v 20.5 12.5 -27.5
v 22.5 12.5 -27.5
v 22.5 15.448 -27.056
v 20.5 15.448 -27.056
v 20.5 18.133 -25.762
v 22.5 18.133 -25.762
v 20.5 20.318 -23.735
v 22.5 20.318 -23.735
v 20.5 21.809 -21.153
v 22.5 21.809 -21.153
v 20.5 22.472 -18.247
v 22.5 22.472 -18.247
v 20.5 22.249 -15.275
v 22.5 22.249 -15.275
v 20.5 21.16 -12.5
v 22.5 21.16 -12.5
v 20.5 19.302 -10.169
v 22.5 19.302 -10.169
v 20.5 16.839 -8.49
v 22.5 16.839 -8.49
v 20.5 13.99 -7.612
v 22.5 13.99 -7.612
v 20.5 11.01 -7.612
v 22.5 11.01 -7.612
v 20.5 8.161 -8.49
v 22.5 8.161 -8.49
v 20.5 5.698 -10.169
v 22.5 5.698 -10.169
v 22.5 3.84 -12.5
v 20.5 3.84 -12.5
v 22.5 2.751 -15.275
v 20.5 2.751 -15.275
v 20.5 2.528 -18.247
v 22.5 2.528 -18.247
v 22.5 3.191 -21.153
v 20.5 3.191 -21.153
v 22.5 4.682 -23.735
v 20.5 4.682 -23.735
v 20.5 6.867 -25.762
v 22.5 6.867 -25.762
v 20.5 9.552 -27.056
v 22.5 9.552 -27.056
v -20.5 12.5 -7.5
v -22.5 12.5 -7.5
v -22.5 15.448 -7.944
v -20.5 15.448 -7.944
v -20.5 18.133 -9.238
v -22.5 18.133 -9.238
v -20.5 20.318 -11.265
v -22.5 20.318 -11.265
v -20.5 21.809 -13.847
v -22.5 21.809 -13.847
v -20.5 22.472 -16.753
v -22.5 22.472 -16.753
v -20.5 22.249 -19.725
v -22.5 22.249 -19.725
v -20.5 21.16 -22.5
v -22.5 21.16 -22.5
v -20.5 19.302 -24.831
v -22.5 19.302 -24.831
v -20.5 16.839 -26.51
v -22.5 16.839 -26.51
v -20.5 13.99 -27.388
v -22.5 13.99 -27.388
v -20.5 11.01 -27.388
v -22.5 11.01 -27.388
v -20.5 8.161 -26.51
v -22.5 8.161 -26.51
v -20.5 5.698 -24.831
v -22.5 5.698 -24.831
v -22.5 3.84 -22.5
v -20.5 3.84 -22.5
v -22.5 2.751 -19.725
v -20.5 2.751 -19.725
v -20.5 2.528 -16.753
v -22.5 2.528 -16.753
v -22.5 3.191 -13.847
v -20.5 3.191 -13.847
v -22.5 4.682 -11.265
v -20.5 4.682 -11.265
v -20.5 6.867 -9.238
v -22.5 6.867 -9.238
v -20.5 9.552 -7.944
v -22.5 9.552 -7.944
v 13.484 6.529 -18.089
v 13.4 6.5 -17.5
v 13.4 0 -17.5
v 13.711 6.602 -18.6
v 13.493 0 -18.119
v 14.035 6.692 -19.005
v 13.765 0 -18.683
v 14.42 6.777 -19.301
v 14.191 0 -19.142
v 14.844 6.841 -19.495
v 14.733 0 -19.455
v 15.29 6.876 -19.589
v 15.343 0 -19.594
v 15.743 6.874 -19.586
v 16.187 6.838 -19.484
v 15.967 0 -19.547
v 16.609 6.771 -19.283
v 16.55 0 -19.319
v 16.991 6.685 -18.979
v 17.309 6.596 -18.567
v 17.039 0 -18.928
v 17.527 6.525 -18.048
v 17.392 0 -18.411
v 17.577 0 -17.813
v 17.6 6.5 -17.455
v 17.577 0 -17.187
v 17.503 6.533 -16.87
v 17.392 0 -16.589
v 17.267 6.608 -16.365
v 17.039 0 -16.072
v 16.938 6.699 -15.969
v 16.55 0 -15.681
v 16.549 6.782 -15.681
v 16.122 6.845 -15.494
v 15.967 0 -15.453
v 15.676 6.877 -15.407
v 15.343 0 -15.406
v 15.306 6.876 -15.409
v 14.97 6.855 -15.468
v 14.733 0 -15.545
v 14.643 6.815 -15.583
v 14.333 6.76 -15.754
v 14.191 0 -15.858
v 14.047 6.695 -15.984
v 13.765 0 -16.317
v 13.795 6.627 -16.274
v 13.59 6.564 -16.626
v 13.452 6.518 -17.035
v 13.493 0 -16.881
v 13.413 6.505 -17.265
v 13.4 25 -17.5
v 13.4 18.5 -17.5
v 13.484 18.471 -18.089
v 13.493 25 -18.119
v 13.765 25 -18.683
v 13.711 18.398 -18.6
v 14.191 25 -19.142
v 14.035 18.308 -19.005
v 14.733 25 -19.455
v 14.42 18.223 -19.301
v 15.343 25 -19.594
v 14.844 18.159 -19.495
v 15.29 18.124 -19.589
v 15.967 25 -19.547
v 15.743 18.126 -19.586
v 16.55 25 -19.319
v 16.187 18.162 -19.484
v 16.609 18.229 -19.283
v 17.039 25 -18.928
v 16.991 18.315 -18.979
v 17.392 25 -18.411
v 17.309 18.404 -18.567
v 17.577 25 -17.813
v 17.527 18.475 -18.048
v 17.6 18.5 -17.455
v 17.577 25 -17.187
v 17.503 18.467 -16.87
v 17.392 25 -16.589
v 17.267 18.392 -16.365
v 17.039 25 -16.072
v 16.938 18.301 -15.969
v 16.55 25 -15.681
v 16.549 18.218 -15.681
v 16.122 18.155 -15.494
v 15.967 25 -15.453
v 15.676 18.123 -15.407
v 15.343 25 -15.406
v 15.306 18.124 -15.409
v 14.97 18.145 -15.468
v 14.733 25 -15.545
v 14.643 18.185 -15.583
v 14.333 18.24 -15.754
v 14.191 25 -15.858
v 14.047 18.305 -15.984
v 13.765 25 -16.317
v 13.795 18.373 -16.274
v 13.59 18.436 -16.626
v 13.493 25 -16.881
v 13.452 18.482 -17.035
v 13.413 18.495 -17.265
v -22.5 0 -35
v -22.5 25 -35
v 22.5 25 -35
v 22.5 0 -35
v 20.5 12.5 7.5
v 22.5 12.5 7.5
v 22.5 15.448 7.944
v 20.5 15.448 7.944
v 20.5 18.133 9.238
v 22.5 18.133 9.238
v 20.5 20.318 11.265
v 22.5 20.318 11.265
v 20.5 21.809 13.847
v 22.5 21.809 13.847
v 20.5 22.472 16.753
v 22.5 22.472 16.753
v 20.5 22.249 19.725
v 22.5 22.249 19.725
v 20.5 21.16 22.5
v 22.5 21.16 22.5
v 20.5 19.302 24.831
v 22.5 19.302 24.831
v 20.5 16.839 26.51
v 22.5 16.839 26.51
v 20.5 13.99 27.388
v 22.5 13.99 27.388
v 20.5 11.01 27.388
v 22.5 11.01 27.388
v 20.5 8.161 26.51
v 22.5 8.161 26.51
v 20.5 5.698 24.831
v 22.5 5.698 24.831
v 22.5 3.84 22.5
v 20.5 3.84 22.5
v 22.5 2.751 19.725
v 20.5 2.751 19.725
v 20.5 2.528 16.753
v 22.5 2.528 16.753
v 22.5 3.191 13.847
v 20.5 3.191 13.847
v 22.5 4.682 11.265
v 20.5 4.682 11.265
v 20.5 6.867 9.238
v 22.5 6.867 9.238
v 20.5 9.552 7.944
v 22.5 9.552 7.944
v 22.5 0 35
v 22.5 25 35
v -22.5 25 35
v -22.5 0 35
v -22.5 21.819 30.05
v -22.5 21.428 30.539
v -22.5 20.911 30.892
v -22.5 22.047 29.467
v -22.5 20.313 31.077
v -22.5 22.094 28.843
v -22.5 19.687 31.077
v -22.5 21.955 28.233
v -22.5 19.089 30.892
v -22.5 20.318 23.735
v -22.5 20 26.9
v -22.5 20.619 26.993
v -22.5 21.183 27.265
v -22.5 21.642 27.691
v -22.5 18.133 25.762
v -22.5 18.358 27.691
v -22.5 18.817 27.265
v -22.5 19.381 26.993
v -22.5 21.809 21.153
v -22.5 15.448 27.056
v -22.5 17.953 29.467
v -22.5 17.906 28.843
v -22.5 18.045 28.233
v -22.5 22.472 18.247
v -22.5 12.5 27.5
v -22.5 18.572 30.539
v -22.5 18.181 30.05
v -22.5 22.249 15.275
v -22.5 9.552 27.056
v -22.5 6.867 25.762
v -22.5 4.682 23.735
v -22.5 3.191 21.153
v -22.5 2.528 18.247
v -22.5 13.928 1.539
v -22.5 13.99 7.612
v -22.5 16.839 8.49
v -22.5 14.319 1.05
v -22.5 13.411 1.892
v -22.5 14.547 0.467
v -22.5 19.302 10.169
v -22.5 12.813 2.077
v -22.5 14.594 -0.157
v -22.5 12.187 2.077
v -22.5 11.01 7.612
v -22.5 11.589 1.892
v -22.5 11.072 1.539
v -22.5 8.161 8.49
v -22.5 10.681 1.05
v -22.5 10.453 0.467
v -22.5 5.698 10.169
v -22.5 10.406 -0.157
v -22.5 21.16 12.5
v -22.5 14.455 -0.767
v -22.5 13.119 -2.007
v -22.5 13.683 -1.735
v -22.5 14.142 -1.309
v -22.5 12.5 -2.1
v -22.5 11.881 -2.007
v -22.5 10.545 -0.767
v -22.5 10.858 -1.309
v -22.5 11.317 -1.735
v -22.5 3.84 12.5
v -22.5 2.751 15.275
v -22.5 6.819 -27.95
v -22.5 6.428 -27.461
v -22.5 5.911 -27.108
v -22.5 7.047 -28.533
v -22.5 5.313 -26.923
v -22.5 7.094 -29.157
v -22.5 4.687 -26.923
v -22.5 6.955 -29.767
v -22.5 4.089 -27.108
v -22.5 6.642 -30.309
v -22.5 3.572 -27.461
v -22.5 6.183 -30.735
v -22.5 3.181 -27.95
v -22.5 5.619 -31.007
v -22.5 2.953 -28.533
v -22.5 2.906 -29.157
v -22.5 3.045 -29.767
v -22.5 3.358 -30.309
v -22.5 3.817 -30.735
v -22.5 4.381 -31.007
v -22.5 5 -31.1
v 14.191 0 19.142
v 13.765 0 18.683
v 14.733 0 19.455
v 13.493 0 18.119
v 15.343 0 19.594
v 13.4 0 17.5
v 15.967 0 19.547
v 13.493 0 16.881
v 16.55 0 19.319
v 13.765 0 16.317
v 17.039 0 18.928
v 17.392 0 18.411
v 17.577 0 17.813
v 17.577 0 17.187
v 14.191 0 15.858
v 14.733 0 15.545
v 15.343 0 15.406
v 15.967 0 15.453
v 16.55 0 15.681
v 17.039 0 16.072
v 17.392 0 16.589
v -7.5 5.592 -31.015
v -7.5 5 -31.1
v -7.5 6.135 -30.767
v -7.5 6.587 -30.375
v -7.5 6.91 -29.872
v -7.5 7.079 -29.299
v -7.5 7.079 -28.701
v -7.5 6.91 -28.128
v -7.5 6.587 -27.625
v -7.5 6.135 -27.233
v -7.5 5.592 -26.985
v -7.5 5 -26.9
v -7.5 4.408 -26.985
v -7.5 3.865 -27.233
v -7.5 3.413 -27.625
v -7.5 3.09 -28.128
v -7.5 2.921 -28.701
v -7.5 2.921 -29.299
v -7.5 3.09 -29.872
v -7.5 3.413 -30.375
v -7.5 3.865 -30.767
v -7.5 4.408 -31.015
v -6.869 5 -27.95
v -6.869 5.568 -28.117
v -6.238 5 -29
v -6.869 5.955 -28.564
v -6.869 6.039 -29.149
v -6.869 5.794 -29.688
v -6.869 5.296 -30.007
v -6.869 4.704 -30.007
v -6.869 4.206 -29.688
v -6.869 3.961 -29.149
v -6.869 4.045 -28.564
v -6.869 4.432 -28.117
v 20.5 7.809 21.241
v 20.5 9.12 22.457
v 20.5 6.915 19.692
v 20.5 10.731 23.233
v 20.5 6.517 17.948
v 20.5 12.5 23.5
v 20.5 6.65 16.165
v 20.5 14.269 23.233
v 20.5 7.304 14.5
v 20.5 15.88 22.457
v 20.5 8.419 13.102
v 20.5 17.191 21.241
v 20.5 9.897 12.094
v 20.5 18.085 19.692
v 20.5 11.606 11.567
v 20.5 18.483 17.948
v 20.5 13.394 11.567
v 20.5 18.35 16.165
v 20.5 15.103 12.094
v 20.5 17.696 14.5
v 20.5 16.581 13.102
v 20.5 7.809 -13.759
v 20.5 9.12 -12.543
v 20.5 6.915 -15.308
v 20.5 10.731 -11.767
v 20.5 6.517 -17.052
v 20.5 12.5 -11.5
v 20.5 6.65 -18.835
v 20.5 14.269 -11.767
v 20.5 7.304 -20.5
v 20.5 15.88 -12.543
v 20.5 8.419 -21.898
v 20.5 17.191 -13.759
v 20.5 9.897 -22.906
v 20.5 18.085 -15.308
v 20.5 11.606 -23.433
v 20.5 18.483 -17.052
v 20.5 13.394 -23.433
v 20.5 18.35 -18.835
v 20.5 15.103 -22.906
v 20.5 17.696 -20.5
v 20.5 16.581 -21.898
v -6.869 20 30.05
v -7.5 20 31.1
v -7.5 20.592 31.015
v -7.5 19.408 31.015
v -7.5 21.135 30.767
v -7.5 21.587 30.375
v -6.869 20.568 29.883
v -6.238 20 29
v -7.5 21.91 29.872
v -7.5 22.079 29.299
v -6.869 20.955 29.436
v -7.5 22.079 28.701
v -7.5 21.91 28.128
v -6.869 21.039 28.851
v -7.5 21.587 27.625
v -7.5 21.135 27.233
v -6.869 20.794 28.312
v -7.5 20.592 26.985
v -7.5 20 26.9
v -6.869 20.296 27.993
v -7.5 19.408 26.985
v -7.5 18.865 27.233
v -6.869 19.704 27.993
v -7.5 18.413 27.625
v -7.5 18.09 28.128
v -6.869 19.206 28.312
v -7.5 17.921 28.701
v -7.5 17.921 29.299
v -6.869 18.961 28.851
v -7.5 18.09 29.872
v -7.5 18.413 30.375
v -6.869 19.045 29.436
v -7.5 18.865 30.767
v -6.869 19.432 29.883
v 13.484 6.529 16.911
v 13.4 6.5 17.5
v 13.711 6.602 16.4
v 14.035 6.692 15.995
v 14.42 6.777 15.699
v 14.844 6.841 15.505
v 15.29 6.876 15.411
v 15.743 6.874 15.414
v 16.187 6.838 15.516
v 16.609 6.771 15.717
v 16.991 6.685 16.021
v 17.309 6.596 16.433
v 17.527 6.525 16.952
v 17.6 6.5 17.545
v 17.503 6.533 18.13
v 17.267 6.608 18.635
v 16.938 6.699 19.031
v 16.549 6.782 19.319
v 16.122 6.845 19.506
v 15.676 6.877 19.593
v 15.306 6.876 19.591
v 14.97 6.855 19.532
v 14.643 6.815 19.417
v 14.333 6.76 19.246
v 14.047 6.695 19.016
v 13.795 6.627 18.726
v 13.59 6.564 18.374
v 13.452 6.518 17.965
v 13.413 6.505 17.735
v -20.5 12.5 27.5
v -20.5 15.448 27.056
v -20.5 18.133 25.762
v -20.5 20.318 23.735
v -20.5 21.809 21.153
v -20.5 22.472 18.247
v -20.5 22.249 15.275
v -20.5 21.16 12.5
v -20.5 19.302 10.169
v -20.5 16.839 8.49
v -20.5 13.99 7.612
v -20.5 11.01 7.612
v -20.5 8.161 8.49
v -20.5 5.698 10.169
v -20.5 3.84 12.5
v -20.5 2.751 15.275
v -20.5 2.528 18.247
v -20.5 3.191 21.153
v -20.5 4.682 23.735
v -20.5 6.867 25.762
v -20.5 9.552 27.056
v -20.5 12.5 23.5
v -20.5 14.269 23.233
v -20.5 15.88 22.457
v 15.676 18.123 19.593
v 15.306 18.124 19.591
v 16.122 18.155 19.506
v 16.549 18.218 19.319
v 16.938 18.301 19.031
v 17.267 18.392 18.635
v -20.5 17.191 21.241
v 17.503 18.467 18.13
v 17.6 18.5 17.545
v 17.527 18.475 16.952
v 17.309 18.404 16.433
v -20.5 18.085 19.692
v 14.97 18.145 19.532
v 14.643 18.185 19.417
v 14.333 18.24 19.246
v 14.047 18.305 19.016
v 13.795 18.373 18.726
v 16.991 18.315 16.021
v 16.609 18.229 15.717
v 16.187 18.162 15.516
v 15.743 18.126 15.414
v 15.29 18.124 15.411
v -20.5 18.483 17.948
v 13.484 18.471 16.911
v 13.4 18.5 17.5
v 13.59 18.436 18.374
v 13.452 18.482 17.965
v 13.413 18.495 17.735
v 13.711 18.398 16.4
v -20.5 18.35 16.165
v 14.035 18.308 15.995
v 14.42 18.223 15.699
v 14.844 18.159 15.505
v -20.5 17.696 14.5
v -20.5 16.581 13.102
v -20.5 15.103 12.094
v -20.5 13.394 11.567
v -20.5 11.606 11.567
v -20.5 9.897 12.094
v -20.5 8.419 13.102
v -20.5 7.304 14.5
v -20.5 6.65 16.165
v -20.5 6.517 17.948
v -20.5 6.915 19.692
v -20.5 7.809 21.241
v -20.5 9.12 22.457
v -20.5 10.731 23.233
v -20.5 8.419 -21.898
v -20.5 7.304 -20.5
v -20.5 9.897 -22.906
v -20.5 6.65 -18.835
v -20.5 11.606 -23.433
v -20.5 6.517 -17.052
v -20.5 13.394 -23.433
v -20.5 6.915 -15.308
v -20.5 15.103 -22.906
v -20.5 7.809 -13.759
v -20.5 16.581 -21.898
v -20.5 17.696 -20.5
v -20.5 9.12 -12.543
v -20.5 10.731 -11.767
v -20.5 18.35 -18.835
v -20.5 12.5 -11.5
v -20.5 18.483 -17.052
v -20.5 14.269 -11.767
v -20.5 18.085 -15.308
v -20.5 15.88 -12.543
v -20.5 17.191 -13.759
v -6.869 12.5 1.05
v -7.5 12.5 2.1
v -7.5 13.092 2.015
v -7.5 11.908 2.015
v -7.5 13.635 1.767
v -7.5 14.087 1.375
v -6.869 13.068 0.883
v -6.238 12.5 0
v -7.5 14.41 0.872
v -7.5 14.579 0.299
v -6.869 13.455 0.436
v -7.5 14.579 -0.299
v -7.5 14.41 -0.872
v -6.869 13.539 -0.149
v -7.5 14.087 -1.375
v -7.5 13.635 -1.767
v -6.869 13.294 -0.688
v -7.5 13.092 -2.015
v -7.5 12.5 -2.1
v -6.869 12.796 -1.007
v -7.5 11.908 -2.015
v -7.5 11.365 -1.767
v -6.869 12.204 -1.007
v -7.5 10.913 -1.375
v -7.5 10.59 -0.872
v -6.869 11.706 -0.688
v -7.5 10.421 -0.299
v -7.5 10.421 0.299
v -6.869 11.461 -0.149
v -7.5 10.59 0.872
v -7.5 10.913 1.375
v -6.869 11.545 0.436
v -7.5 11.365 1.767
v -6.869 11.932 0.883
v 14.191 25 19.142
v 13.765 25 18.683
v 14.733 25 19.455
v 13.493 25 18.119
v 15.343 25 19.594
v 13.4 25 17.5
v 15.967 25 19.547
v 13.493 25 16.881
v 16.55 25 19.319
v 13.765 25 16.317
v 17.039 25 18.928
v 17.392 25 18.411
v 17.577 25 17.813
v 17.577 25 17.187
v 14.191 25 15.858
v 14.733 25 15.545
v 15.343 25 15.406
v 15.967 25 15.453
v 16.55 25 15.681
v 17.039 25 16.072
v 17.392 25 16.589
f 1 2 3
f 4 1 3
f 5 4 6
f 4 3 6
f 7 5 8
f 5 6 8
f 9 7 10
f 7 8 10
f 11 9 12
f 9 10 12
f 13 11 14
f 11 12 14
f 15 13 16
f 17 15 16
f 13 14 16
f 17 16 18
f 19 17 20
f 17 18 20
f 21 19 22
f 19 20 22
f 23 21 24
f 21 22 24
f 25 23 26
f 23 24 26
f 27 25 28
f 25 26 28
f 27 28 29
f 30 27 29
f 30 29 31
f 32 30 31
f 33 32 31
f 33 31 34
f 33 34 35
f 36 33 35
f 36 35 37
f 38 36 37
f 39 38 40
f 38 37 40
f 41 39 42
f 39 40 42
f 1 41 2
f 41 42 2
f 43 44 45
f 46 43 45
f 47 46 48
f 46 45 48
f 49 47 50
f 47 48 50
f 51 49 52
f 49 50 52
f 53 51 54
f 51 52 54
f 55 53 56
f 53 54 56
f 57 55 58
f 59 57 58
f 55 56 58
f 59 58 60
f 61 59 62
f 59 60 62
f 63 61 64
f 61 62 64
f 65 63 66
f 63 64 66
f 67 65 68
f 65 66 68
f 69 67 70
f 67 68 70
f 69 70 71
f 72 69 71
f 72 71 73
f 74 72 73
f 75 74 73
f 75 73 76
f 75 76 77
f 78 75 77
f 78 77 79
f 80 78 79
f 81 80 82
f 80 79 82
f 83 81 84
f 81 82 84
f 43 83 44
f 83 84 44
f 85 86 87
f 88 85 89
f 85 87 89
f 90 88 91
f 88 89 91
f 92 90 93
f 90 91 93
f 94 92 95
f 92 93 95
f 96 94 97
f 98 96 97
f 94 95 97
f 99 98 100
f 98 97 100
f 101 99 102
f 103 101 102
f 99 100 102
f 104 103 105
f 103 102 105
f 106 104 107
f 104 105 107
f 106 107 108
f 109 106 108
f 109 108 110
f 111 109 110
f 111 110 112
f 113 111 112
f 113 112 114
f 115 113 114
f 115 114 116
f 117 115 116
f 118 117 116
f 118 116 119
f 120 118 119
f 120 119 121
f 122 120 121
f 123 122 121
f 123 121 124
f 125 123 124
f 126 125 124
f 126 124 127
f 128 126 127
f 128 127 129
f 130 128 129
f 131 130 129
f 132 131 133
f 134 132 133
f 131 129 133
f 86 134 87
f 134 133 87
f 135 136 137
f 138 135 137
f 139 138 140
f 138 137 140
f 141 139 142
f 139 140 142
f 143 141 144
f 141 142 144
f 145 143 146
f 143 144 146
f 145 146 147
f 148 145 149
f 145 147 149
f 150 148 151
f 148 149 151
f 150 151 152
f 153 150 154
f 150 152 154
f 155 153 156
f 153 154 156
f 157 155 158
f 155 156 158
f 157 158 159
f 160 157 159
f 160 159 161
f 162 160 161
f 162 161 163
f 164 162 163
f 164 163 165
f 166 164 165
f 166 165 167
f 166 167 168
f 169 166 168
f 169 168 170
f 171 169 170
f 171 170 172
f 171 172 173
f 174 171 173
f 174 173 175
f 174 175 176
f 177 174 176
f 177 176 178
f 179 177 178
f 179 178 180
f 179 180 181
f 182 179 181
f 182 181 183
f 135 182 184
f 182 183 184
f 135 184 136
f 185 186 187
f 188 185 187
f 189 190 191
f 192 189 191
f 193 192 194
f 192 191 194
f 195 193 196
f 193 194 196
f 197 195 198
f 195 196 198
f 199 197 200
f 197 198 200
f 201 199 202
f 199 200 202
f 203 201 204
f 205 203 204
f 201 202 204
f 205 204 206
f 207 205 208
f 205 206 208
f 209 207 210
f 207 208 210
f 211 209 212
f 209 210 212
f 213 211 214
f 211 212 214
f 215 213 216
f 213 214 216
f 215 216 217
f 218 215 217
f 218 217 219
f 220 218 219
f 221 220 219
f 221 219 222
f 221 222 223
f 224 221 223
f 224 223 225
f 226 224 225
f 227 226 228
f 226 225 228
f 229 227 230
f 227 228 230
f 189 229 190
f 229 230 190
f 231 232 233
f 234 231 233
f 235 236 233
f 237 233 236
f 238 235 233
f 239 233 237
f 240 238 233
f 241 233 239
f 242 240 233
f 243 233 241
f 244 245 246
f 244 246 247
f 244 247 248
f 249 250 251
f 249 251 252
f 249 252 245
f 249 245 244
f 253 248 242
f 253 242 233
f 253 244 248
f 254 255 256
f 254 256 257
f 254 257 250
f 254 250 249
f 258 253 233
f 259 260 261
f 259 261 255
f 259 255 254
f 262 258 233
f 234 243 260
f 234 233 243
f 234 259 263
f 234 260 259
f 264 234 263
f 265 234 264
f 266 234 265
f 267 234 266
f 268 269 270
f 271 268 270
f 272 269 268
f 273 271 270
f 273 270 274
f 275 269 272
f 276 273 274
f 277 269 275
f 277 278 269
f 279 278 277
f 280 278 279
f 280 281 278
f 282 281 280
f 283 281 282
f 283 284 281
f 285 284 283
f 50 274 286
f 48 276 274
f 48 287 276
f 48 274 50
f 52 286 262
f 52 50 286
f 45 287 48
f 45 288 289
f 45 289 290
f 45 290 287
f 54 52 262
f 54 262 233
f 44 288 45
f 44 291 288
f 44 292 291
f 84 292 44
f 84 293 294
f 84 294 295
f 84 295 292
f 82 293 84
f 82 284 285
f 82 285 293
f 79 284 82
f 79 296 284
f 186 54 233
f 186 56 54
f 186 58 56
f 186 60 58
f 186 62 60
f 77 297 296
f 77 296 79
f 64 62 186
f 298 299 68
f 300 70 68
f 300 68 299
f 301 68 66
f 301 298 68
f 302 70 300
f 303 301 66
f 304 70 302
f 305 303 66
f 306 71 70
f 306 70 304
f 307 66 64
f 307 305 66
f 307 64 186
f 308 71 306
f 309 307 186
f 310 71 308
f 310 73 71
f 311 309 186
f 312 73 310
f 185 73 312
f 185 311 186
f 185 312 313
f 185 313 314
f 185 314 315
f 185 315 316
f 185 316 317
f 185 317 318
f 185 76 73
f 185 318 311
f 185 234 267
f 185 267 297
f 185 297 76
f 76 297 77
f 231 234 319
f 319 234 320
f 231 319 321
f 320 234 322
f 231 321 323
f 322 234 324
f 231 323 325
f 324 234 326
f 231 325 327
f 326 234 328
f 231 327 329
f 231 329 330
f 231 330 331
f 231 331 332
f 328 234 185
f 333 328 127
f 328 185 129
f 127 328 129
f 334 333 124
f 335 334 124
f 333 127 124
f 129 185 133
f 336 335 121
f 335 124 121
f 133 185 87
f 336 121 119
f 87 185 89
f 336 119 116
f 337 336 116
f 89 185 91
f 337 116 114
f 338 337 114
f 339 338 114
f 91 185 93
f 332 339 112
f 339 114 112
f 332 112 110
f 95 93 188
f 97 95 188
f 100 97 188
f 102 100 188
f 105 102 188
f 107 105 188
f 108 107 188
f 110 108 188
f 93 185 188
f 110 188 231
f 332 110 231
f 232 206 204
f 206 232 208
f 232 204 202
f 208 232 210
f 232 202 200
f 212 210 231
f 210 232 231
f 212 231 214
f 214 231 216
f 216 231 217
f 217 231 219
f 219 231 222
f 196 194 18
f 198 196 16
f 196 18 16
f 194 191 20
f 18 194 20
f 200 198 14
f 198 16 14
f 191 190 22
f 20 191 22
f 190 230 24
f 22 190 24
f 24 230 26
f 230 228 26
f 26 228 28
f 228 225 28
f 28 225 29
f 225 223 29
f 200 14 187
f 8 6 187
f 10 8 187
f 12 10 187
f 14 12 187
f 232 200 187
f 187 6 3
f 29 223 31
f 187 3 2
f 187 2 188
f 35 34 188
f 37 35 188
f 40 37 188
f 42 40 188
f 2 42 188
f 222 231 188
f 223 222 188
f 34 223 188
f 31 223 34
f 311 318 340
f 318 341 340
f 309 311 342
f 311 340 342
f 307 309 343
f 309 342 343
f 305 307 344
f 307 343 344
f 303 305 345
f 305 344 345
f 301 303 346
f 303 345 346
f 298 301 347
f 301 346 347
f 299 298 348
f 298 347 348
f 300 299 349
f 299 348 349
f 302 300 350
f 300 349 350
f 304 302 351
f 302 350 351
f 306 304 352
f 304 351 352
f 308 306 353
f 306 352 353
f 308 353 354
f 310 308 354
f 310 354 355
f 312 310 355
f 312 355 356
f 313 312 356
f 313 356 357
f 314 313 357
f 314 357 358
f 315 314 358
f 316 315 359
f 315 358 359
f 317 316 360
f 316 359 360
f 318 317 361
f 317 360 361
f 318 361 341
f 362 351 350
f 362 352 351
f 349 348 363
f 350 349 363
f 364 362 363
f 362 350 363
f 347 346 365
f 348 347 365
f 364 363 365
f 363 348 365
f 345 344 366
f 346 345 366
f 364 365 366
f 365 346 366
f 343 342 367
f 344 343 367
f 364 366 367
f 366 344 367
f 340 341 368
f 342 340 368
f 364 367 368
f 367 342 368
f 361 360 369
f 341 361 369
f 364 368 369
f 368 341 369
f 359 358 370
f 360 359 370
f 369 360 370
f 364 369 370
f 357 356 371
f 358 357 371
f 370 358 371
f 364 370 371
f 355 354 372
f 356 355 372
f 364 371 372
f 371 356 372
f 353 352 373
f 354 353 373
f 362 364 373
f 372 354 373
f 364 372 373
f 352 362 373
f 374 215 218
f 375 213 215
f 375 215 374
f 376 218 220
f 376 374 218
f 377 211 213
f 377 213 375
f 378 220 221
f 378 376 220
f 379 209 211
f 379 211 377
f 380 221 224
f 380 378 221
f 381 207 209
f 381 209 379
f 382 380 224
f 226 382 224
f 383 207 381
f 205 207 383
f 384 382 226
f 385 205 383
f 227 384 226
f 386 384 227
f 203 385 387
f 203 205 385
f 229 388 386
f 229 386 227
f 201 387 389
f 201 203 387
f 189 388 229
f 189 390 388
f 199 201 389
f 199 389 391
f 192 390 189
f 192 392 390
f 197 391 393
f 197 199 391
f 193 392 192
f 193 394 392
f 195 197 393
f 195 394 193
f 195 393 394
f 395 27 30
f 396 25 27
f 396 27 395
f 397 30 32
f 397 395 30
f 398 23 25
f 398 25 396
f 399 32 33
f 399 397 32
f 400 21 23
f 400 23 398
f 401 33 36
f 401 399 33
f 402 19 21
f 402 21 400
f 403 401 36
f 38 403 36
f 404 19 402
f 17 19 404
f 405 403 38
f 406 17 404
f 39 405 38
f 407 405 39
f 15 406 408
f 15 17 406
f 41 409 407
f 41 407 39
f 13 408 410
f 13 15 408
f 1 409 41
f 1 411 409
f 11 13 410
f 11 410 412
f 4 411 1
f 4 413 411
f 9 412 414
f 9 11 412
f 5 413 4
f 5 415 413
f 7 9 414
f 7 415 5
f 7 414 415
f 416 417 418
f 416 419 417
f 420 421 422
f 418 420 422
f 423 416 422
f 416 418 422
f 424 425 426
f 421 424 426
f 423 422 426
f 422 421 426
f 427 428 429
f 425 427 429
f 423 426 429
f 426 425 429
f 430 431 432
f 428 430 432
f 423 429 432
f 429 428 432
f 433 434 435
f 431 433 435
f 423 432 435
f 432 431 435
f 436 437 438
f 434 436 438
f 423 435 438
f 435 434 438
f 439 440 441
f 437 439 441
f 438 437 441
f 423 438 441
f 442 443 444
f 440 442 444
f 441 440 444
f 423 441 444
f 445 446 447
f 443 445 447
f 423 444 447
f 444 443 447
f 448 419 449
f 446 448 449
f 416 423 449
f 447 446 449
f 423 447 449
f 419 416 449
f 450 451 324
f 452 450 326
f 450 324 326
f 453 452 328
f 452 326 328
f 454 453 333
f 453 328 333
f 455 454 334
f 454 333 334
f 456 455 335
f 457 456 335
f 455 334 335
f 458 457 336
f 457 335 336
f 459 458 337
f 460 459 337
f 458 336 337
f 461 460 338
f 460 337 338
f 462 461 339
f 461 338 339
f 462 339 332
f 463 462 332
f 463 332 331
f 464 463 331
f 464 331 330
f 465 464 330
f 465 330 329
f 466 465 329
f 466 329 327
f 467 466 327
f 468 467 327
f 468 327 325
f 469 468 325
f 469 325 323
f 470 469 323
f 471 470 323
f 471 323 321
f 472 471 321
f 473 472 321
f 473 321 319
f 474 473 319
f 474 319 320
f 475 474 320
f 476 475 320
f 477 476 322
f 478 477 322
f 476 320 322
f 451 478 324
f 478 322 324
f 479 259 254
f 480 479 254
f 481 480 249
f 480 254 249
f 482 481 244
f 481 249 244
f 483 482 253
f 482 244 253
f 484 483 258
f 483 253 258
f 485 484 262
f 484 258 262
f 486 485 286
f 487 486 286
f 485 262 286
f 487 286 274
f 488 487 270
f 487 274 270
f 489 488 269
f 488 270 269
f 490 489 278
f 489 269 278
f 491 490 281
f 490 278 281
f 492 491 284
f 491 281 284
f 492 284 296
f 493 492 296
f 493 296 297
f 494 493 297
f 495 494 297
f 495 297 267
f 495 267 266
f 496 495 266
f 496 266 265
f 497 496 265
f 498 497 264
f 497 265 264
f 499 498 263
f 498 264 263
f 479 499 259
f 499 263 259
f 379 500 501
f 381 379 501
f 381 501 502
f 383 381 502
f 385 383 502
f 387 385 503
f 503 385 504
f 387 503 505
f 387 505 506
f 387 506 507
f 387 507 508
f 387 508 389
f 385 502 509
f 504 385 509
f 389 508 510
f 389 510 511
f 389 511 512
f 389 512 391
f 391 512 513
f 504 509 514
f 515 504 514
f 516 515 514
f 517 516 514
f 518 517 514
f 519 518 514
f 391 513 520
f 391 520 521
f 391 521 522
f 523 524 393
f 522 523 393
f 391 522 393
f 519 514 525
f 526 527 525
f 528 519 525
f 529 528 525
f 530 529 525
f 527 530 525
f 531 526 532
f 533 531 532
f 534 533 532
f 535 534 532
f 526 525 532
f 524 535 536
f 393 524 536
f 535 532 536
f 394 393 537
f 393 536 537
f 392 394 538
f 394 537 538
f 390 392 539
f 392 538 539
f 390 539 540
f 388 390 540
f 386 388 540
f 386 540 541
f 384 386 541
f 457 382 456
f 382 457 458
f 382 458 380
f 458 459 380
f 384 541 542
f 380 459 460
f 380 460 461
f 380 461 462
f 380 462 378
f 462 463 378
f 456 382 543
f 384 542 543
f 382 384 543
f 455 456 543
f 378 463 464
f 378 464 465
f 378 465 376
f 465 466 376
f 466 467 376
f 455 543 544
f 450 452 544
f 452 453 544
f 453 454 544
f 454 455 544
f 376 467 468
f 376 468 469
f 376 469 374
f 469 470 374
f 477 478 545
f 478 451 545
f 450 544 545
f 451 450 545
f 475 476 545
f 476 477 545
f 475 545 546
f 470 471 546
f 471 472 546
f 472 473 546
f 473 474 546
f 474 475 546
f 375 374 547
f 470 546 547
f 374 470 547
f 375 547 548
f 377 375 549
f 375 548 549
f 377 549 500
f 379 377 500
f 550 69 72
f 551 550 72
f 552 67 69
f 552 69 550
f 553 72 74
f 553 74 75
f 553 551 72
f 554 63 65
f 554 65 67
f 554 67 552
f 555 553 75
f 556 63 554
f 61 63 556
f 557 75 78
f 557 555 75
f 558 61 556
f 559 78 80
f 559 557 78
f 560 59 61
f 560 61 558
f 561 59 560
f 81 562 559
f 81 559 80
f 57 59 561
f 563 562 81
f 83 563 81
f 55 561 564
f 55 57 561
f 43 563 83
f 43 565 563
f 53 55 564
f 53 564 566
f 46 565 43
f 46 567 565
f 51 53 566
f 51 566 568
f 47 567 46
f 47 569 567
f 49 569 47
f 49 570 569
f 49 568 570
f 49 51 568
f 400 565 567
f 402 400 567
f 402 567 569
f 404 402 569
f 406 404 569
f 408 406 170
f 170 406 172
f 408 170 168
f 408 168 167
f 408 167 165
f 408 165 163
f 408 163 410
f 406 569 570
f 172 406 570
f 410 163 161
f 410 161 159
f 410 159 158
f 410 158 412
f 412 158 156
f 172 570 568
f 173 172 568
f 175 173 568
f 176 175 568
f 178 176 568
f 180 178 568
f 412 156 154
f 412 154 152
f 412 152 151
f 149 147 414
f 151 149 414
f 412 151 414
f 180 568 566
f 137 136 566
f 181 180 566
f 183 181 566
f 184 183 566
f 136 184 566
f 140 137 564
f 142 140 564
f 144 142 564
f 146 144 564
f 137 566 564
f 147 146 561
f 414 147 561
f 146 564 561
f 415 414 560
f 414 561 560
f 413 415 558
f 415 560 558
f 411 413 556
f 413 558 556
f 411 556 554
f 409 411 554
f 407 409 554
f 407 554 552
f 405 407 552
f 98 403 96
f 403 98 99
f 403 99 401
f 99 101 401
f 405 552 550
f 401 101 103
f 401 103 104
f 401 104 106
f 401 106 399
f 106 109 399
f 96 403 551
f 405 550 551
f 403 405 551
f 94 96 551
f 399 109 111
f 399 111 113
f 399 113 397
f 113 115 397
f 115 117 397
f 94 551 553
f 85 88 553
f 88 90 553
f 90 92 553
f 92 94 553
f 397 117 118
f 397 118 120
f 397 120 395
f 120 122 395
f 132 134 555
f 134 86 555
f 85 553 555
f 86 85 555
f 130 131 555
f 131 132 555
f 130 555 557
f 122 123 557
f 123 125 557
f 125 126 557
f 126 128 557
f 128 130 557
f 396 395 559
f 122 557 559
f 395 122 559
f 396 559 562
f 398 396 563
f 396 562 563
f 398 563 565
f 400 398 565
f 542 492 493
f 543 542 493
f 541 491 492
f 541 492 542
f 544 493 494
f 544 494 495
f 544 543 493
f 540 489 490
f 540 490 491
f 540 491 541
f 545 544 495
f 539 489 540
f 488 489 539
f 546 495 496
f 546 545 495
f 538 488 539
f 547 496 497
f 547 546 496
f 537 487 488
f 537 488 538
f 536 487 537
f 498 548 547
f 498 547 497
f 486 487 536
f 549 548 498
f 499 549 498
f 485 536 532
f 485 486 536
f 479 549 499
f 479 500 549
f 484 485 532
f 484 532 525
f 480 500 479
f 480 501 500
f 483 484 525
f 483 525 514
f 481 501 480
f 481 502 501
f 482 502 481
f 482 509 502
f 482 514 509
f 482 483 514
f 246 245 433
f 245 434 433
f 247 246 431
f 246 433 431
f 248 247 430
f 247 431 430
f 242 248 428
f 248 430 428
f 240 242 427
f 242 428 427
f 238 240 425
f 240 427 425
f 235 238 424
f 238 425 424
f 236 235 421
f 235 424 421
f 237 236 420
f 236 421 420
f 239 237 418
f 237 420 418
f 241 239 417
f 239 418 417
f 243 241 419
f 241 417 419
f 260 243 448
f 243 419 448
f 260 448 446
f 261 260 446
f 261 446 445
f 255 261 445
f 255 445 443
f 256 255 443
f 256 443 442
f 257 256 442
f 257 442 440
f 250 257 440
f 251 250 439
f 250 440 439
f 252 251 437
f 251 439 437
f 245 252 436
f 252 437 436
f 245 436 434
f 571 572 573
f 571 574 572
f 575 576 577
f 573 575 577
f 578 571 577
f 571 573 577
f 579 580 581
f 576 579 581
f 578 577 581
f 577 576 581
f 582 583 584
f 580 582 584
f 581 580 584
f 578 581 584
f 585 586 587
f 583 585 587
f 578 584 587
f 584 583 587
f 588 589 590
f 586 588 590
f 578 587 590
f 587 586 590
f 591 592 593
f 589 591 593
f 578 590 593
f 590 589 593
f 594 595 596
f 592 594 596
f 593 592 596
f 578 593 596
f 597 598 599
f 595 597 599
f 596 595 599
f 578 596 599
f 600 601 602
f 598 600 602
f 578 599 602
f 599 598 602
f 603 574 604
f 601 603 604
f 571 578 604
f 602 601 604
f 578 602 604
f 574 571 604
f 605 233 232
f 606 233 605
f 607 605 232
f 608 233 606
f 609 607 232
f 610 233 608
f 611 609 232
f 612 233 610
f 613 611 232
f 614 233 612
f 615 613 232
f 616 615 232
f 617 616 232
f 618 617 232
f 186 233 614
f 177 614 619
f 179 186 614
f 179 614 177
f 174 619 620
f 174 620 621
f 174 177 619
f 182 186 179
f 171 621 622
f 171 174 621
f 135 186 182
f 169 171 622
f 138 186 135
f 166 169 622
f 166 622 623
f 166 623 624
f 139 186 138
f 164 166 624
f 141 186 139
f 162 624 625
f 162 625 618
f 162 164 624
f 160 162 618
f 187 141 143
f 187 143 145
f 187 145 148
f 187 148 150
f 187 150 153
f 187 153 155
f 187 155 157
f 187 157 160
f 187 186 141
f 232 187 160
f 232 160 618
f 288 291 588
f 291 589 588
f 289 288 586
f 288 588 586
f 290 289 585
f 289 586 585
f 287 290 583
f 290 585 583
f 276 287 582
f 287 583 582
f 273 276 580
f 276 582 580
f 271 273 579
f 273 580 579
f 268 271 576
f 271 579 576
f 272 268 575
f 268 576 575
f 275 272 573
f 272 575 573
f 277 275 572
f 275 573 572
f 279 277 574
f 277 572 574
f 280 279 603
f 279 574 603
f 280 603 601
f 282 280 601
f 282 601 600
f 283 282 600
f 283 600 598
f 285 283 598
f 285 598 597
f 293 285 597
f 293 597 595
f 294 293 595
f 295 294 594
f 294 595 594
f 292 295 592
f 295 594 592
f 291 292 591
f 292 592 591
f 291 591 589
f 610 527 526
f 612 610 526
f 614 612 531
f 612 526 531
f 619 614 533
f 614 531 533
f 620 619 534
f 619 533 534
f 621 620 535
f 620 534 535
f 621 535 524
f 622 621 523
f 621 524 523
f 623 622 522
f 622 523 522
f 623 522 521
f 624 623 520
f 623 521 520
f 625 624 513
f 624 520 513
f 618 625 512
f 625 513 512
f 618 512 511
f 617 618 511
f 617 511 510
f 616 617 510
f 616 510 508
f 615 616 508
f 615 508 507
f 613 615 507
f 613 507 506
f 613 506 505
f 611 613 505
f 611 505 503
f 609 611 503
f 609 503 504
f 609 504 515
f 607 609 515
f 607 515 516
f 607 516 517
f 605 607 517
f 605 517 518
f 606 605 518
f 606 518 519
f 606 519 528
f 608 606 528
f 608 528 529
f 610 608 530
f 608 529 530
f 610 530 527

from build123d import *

# Parameters (mm, degrees)
SKETCH1_W                = 45
SKETCH1_H                = 102
BOSS_EXTRUDE1_DEPTH      = 25
M5_TAPPED_HOLE3_D        = 4.2
SKETCH27_R               = 6
CUT_EXTRUDE1_DEPTH       = 74
SKETCH28_R               = 10
CUT_EXTRUDE3_DEPTH       = 2
SKETCH30_R               = 10
CUT_EXTRUDE4_DEPTH       = 2
M5_TAPPED_HOLE4_D        = 4.2
M5_TAPPED_HOLE4_DEPTH    = 14
M5_TAPPED_HOLE4_TIP      = 1.2618073
M5_TAPPED_HOLE5_D        = 4.2
M5_TAPPED_HOLE5_DEPTH    = 15
M5_TAPPED_HOLE5_TIP      = 1.2618073
CUT_EXTRUDE5_DEPTH       = 1.0000001
CUT_EXTRUDE5_DEPTH_BACK  = 26.0000001
CUT_EXTRUDE12_DEPTH      = 1.0000001
CUT_EXTRUDE12_DEPTH_BACK = 26.0000001
M5_TAPPED_HOLE6_D        = 4.2
M5_TAPPED_HOLE6_DEPTH    = 15
M5_TAPPED_HOLE6_TIP      = 1.2618073


with BuildPart() as part:
    # Sketch1 → Boss-Extrude1 (new body)
    with BuildSketch(Plane(origin=(0, 0, 0), x_dir=(1, 0, 0), z_dir=(0, 1, 0))):
        Rectangle(SKETCH1_W, SKETCH1_H)
    extrude(amount=BOSS_EXTRUDE1_DEPTH)

    # M5 Tapped Hole3 (through all)
    with Locations(Plane(origin=(0, 25, 0), x_dir=(1, 0, 0), z_dir=(0, 1, 0))):
        with Locations((15.5, 17.5), (15.5, -17.5)):
            Hole(M5_TAPPED_HOLE3_D / 2)

    # Sketch27 → Cut-Extrude1 (cut)
    with BuildSketch(Plane.ZY.offset(22.5)):
        with Locations((-17.5, 12.5)):
            Circle(SKETCH27_R)
        with Locations((17.5, 12.5)):
            Circle(SKETCH27_R)
    extrude(amount=-CUT_EXTRUDE1_DEPTH, mode=Mode.SUBTRACT)

    # Sketch28 → Cut-Extrude3 (cut)
    with BuildSketch(Plane.ZY.offset(22.5)):
        with Locations((-17.5, 12.5)):
            Circle(SKETCH28_R)
        with Locations((17.5, 12.5)):
            Circle(SKETCH28_R)
    extrude(amount=-CUT_EXTRUDE3_DEPTH, mode=Mode.SUBTRACT)

    # Sketch30 → Cut-Extrude4 (cut)
    with BuildSketch(Plane(origin=(22.5, 0, 0), x_dir=(0, 0, -1), z_dir=(1, 0, 0))):
        with Locations((-17.5, 12.5)):
            Circle(SKETCH30_R)
        with Locations((17.5, 12.5)):
            Circle(SKETCH30_R)
    extrude(amount=-CUT_EXTRUDE4_DEPTH, mode=Mode.SUBTRACT)

    # M5 Tapped Hole4
    with Locations(Plane(origin=(0, 0, -51), x_dir=(-1, 0, 0), z_dir=(0, 0, -1))):
        with Locations((-18, 5), (18, 20)):
            Hole(M5_TAPPED_HOLE4_D / 2, depth=M5_TAPPED_HOLE4_DEPTH)
            with Locations((0, 0, -(M5_TAPPED_HOLE4_DEPTH + M5_TAPPED_HOLE4_TIP / 2))):  # 118° drill point
                Cone(0, M5_TAPPED_HOLE4_D / 2, M5_TAPPED_HOLE4_TIP, mode=Mode.SUBTRACT)

    # M5 Tapped Hole5
    with Locations(Plane.ZY.offset(22.5)):
        with Locations((0, 12.5)):
            Hole(M5_TAPPED_HOLE5_D / 2, depth=M5_TAPPED_HOLE5_DEPTH)
            with Locations((0, 0, -(M5_TAPPED_HOLE5_DEPTH + M5_TAPPED_HOLE5_TIP / 2))):  # 118° drill point
                Cone(0, M5_TAPPED_HOLE5_D / 2, M5_TAPPED_HOLE5_TIP, mode=Mode.SUBTRACT)

    # Sketch37 → Cut-Extrude5 (cut, two sides)
    with BuildSketch(Plane(origin=(0, 25, 0), x_dir=(1, 0, 0), z_dir=(0, 1, 0))) as cut_extrude5_sk:
        Polygon((-226.623671921, 35), (-22.5, 35), (22.5, 35), (226.623671921, 35), (226.623671921, 443.247343842), (-226.623671921, 443.247343842), align=None)
    extrude(amount=CUT_EXTRUDE5_DEPTH, mode=Mode.SUBTRACT)
    extrude(cut_extrude5_sk.sketch, amount=-CUT_EXTRUDE5_DEPTH_BACK, mode=Mode.SUBTRACT)

    # Sketch38 → Cut-Extrude12 (cut, two sides)
    with BuildSketch(Plane(origin=(0, 25, 0), x_dir=(1, 0, 0), z_dir=(0, 1, 0))) as cut_extrude12_sk:
        Polygon((-198.933169771, -35), (-22.5, -35), (22.5, -35), (198.933169771, -35), (198.933169771, -387.866339542), (-198.933169771, -387.866339542), align=None)
    extrude(amount=CUT_EXTRUDE12_DEPTH, mode=Mode.SUBTRACT)
    extrude(cut_extrude12_sk.sketch, amount=-CUT_EXTRUDE12_DEPTH_BACK, mode=Mode.SUBTRACT)

    # M5 Tapped Hole6
    with Locations(Plane.ZY.offset(22.5)):
        with Locations((-29, 5), (29, 20)):
            Hole(M5_TAPPED_HOLE6_D / 2, depth=M5_TAPPED_HOLE6_DEPTH)
            with Locations((0, 0, -(M5_TAPPED_HOLE6_DEPTH + M5_TAPPED_HOLE6_TIP / 2))):  # 118° drill point
                Cone(0, M5_TAPPED_HOLE6_D / 2, M5_TAPPED_HOLE6_TIP, mode=Mode.SUBTRACT)


solid = part.part
